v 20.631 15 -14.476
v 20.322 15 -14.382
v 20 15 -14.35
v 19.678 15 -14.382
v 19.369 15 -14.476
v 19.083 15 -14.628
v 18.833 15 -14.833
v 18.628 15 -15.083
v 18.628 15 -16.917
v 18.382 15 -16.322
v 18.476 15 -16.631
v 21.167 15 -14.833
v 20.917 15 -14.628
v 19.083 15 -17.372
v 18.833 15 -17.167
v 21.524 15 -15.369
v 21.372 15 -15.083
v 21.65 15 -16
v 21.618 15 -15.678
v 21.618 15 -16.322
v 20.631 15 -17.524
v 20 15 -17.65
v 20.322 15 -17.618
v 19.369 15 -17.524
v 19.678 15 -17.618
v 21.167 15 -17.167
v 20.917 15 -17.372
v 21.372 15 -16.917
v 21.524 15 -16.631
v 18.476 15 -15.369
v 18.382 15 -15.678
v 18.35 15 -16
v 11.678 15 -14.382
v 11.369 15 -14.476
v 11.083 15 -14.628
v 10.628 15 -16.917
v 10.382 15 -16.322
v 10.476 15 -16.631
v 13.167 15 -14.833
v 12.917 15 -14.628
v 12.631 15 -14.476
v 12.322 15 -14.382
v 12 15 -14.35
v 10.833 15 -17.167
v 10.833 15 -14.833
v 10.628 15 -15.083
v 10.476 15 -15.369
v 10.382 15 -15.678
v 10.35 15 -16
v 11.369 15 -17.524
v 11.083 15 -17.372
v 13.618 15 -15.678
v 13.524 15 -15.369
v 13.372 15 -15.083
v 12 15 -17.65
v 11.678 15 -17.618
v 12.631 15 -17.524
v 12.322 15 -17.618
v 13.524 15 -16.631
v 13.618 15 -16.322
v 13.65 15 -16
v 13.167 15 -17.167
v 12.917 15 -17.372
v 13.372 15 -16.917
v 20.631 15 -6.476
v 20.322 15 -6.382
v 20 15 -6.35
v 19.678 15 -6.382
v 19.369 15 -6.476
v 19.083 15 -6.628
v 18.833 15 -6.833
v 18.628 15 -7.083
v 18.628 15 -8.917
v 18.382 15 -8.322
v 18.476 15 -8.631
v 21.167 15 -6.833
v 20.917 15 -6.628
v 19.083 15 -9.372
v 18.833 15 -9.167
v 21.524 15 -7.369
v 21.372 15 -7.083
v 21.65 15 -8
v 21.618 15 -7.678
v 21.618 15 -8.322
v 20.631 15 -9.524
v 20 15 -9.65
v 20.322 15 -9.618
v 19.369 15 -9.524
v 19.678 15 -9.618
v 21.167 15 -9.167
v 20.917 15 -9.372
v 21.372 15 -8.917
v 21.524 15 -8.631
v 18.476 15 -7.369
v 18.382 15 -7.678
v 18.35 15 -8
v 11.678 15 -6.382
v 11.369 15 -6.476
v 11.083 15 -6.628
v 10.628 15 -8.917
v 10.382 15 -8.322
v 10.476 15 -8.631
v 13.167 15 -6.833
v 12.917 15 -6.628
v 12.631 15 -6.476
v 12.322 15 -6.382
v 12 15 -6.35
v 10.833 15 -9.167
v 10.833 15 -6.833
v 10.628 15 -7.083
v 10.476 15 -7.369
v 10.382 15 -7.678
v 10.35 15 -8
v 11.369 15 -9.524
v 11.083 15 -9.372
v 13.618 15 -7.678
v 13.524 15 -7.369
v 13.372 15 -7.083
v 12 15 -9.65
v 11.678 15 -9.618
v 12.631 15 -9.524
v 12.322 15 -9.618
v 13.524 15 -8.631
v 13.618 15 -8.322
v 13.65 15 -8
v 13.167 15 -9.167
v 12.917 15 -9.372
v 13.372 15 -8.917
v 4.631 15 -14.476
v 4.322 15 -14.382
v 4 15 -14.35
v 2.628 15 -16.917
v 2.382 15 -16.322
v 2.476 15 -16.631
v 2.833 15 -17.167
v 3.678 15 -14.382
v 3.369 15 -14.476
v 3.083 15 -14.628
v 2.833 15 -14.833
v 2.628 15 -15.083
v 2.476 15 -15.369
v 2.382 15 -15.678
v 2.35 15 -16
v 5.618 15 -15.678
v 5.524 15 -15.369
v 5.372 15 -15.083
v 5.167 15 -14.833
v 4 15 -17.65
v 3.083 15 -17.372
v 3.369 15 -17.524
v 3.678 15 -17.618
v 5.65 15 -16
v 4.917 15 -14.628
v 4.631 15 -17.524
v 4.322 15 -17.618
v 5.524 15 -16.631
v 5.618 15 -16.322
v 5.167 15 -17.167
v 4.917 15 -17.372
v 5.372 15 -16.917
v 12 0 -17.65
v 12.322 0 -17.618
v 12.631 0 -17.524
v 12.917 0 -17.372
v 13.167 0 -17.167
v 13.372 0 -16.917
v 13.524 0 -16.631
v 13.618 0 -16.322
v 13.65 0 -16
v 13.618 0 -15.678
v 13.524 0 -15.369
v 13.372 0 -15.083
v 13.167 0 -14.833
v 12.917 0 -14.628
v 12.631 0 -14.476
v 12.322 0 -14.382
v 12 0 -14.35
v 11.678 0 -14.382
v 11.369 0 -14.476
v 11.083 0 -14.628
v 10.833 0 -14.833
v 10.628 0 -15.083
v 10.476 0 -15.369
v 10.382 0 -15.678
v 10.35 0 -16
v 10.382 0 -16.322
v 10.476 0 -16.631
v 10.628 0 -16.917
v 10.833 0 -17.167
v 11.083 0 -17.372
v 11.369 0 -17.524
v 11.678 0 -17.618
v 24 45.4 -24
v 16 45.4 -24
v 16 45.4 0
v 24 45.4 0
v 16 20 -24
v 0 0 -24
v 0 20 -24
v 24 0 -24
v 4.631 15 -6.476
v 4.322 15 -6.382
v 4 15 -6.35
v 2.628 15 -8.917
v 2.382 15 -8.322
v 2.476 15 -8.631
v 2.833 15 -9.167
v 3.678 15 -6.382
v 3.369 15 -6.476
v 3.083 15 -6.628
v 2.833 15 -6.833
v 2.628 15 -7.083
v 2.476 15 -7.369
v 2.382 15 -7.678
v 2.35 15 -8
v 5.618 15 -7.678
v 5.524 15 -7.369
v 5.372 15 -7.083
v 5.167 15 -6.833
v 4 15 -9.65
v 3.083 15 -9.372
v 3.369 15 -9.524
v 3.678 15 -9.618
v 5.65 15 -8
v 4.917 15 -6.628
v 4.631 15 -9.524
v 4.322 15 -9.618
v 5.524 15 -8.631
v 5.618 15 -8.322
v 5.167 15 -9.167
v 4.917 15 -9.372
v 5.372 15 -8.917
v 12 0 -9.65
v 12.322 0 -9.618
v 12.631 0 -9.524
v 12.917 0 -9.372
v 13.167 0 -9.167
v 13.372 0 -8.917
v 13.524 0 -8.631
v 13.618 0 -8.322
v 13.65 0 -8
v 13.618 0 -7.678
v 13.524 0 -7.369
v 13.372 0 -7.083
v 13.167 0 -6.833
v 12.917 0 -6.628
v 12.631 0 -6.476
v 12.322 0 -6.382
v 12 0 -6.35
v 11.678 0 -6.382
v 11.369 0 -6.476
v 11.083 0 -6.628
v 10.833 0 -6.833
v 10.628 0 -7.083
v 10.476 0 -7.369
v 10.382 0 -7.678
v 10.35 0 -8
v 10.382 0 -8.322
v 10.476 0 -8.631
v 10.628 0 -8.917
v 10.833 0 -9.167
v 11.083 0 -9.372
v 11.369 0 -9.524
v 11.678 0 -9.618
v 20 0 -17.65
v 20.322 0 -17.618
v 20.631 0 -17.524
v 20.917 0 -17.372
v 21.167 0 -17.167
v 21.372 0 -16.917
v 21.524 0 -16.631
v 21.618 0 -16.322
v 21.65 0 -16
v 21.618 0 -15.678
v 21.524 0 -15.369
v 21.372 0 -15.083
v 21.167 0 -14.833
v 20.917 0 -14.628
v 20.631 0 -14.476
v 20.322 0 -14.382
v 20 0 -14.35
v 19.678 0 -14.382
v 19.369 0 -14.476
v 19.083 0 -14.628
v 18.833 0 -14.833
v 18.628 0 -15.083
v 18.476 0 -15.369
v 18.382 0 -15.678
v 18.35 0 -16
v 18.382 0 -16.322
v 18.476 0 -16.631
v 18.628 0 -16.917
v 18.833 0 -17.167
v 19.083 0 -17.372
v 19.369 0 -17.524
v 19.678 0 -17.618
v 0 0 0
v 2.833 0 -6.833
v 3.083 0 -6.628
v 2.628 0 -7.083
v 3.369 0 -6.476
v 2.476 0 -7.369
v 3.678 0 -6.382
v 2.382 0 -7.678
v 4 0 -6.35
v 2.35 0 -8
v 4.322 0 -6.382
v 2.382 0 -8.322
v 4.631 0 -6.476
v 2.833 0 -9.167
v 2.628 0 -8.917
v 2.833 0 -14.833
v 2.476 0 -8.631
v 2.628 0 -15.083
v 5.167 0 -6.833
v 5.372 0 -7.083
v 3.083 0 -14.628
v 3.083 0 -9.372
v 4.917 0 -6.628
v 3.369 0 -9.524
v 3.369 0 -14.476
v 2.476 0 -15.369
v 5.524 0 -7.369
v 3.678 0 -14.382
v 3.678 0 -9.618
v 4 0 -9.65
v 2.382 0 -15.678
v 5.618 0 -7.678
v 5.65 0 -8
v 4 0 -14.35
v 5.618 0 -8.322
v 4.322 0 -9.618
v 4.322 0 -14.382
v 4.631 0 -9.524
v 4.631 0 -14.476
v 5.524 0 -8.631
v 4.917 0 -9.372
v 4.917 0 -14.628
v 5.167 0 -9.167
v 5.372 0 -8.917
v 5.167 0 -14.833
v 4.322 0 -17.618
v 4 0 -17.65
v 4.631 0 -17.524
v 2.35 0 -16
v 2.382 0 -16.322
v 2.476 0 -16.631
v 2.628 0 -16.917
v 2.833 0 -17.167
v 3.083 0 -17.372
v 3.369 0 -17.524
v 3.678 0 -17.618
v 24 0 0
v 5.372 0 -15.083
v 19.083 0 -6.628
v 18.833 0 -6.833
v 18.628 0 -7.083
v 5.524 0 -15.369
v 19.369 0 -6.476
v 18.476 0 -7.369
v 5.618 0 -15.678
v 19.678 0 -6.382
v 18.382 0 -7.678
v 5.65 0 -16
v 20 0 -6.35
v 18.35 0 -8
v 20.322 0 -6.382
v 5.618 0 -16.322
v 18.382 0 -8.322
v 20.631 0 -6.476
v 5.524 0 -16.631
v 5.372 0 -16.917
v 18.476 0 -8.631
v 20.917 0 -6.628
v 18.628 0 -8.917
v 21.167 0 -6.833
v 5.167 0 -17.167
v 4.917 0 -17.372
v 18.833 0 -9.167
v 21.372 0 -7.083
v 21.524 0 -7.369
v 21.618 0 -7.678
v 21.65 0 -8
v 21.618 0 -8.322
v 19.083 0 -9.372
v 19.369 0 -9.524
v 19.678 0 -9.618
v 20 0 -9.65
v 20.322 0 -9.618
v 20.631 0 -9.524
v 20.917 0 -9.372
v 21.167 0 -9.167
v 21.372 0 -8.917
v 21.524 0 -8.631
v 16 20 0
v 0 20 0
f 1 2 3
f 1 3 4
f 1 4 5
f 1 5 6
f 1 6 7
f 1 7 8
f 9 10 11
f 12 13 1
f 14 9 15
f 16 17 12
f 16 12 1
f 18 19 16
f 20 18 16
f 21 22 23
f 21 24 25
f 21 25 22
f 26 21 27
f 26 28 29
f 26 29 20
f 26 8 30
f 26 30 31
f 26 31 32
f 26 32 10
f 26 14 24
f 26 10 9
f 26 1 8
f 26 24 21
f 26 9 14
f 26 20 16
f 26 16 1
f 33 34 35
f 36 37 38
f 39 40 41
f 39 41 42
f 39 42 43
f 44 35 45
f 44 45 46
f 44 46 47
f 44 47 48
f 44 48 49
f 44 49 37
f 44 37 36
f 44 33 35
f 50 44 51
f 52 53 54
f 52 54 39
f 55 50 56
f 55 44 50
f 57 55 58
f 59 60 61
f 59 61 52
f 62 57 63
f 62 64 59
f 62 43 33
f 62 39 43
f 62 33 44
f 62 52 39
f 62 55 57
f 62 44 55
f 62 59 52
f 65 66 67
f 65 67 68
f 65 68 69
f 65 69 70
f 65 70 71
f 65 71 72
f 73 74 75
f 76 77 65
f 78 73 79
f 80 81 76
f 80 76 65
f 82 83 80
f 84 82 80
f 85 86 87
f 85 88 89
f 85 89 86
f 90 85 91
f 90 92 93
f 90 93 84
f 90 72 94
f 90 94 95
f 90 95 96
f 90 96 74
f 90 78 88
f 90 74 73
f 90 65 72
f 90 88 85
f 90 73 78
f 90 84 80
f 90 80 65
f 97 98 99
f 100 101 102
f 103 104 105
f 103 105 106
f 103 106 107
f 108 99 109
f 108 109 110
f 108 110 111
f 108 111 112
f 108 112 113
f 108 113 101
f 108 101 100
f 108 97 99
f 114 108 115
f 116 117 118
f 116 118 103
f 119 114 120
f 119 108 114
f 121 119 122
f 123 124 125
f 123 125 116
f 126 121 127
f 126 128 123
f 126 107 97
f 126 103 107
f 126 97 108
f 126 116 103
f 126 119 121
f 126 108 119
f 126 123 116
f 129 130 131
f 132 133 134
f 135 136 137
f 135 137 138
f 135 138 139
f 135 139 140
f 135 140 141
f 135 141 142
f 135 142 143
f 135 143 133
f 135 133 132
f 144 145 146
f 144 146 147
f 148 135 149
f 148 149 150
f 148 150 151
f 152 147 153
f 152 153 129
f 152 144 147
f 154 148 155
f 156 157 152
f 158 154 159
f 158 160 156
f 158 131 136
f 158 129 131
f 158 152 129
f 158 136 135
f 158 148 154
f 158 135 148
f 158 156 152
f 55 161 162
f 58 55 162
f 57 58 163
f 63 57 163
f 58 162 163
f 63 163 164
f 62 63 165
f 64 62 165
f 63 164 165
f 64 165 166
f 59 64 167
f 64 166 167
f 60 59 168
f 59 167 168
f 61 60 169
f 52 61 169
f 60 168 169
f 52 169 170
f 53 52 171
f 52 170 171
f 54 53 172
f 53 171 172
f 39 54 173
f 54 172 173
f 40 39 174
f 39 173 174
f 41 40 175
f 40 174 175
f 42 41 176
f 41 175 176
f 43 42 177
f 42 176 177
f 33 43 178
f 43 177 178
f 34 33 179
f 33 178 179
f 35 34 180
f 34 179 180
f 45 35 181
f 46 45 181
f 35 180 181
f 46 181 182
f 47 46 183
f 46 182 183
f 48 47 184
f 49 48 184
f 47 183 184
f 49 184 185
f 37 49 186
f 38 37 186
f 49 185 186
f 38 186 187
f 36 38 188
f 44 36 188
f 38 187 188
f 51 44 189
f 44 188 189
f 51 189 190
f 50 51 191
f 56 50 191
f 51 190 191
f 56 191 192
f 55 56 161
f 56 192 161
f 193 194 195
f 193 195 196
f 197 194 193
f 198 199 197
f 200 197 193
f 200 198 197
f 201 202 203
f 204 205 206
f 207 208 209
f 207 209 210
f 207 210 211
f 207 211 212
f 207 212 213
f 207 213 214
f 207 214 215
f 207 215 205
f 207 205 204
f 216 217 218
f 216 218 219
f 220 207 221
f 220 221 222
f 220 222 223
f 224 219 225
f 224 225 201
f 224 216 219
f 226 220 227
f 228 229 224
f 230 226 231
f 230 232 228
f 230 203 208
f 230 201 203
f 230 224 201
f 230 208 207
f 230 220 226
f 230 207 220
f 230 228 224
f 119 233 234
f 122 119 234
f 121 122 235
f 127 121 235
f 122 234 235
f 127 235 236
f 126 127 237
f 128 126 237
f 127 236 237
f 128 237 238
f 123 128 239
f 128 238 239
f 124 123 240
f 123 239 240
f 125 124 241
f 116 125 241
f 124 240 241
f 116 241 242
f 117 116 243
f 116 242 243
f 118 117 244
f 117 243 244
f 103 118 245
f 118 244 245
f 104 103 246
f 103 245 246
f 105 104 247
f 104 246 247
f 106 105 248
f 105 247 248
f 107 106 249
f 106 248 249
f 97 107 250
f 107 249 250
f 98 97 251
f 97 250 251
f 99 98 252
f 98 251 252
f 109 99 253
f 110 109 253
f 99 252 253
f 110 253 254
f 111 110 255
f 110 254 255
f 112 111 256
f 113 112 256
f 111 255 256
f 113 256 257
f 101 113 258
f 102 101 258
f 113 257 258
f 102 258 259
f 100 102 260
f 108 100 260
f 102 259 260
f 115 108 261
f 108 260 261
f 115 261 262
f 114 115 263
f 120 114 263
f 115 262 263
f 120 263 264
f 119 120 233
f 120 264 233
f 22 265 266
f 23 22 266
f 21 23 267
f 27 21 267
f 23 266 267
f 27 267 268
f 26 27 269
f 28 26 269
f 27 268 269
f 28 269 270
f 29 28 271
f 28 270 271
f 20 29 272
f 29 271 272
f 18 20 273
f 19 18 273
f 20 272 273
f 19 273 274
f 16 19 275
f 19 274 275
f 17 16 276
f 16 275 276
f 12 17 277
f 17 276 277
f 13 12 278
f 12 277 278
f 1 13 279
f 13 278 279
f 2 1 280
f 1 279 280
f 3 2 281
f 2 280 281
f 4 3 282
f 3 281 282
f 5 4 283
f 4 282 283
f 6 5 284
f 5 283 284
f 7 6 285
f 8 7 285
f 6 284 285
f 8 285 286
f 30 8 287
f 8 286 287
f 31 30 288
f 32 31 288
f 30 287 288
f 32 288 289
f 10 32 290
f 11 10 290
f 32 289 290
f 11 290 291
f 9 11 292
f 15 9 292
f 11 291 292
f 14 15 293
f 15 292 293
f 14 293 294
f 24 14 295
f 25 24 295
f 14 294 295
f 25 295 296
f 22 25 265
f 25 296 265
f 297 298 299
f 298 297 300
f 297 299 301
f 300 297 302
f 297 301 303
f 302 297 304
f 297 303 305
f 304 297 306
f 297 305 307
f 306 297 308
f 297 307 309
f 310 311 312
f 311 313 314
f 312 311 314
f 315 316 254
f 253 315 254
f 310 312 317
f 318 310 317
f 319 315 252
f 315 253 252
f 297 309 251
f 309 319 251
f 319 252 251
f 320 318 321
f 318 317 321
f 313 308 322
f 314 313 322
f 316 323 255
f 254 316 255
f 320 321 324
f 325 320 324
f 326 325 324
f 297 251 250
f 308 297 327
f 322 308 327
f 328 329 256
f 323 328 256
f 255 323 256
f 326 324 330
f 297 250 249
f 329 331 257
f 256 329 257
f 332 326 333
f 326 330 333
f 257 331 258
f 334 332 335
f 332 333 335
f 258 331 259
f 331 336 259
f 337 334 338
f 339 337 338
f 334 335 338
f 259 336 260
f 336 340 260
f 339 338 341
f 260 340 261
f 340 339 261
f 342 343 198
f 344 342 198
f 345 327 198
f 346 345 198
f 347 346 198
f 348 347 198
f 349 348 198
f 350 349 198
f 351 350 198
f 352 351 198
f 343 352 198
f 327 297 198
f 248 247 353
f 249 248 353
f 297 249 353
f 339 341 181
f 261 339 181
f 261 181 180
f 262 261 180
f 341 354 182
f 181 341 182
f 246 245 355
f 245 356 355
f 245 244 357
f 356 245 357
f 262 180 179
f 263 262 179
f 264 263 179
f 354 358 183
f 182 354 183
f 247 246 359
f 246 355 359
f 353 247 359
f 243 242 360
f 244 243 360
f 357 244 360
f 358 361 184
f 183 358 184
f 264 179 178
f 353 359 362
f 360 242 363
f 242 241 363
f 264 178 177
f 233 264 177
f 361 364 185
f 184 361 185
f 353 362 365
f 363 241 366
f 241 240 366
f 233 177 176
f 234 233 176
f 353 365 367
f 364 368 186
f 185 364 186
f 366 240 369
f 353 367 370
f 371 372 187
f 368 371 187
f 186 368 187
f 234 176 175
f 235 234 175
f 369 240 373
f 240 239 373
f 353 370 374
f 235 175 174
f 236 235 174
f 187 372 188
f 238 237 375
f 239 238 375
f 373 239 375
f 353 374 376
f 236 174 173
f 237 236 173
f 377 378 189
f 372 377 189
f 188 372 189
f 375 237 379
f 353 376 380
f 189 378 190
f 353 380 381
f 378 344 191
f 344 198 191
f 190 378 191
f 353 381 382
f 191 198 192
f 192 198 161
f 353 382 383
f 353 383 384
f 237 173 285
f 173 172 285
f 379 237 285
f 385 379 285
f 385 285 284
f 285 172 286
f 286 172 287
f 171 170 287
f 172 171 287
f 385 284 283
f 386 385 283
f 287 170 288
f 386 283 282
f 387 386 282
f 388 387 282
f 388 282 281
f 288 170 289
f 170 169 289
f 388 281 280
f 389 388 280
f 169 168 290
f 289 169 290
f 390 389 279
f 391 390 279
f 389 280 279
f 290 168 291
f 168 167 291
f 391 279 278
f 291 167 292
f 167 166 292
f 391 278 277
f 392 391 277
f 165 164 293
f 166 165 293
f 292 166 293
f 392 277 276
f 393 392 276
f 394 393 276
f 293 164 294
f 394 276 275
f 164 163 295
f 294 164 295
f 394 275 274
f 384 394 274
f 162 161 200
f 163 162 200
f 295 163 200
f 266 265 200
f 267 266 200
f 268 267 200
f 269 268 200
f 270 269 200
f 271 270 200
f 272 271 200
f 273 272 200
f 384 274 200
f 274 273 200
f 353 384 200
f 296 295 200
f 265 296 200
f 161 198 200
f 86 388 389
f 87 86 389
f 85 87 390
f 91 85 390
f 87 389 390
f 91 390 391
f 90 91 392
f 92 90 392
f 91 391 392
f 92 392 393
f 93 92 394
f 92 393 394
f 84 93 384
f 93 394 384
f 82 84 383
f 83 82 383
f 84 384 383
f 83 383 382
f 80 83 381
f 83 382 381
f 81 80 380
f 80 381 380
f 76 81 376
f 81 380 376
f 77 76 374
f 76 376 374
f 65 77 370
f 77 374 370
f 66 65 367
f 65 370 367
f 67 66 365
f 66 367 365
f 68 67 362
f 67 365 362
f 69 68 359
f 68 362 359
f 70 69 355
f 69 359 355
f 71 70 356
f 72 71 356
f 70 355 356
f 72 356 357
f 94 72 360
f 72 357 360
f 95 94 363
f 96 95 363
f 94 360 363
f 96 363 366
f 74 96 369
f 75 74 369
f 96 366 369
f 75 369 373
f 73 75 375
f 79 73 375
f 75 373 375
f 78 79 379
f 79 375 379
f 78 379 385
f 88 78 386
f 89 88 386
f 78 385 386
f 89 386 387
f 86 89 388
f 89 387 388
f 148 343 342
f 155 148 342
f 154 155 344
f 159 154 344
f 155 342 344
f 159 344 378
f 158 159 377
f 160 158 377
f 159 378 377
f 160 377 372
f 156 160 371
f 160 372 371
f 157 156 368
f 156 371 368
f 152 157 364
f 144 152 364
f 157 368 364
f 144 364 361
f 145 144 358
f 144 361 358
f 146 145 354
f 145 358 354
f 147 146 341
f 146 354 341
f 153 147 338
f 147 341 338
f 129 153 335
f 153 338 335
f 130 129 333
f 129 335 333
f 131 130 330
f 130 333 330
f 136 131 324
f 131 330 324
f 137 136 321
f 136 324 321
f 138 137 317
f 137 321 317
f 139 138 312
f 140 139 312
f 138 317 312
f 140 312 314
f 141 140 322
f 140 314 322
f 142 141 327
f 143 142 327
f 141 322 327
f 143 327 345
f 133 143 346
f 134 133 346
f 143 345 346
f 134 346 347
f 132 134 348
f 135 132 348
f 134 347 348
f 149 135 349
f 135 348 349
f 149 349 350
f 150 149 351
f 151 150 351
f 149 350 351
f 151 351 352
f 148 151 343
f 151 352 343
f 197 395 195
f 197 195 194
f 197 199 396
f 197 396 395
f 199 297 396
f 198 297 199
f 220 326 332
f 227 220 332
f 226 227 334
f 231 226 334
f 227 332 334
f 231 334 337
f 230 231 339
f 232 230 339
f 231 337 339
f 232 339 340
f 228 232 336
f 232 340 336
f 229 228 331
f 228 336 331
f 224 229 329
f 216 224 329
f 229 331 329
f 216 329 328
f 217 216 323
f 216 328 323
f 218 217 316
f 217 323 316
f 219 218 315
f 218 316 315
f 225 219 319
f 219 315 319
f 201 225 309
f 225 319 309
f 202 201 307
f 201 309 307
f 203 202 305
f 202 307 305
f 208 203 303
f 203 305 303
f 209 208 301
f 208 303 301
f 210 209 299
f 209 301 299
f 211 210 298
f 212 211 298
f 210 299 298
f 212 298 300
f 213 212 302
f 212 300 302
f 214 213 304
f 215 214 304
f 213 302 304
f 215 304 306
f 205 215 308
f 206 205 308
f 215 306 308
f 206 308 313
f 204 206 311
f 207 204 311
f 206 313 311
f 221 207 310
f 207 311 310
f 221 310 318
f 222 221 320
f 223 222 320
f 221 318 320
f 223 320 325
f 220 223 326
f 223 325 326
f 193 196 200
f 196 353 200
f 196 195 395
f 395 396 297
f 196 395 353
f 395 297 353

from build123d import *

# Parameters (mm, degrees)
SKETCH1_W           = 24
SKETCH1_H           = 24
BOSS_EXTRUDE1_DEPTH = 20
SKETCH2_W           = 8
SKETCH2_H           = 24
BOSS_EXTRUDE2_DEPTH = 25.4
SKETCH3_R           = 1.65
CUT_EXTRUDE1_DEPTH  = 15


with BuildPart() as part:
    # Sketch1 → Boss-Extrude1 (new body)
    with BuildSketch(Plane(origin=(0, 0, 0), x_dir=(1, 0, 0), z_dir=(0, 1, 0))):
        with Locations((12, 12)):
            Rectangle(SKETCH1_W, SKETCH1_H)
    extrude(amount=BOSS_EXTRUDE1_DEPTH)

    # Sketch2 → Boss-Extrude2 (add)
    with BuildSketch(Plane(origin=(0, 20, 0), x_dir=(1, 0, 0), z_dir=(0, 1, 0))):
        with Locations((20, 12)):
            Rectangle(SKETCH2_W, SKETCH2_H)
    extrude(amount=BOSS_EXTRUDE2_DEPTH)

    # Sketch3 → Cut-Extrude1 (cut)
    with BuildSketch(Plane(origin=(0, 0, 0), x_dir=(-1, 0, 0), z_dir=(0, -1, 0))):
        with Locations(Location((-4, 16, 0), (0, 0, 90))):
            Circle(SKETCH3_R)
        with Locations(Location((-4, 8, 0), (0, 0, 90))):
            Circle(SKETCH3_R)
        with Locations(Location((-12, 8, 0), (0, 0, 90))):
            Circle(SKETCH3_R)
        with Locations(Location((-12, 16, 0), (0, 0, 90))):
            Circle(SKETCH3_R)
        with Locations(Location((-20, 8, 0), (0, 0, 90))):
            Circle(SKETCH3_R)
        with Locations(Location((-20, 16, 0), (0, 0, 90))):
            Circle(SKETCH3_R)
    extrude(amount=-CUT_EXTRUDE1_DEPTH, mode=Mode.SUBTRACT)


solid = part.part
